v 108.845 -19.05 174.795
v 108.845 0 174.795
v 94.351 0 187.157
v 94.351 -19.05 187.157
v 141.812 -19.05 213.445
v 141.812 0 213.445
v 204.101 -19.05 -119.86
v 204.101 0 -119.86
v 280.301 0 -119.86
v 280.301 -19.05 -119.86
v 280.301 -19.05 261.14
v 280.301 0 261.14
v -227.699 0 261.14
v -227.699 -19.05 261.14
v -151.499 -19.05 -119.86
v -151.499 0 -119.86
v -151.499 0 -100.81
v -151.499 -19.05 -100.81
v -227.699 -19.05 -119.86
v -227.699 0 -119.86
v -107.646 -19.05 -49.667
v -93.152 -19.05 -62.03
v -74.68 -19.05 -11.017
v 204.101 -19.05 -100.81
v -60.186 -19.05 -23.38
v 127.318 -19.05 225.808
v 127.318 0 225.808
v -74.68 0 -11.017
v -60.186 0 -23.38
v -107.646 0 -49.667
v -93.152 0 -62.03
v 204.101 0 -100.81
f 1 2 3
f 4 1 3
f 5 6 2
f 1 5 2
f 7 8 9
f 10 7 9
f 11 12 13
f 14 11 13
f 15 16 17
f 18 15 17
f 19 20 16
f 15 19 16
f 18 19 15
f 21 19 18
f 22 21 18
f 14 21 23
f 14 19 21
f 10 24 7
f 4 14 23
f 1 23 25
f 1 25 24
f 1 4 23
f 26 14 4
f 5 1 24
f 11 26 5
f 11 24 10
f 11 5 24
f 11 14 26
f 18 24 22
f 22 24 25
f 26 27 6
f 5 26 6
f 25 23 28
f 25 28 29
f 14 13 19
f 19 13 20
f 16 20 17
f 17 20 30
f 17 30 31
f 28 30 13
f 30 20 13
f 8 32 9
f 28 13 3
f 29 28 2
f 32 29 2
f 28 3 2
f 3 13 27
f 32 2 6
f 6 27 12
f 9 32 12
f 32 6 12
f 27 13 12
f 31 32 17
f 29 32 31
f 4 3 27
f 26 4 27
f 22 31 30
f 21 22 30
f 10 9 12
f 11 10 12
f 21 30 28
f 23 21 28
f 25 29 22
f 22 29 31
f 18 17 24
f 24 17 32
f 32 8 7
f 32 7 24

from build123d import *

# Parameters (mm, degrees)
F0_W     = 76.2
F0_H     = 19.05
F1_DEPTH = 19.05


with BuildPart() as f1:
    # F0 (on Front) → F1 (new body)
    with BuildSketch(Plane.XZ):
        Polygon((280.301026, 261.140416), (-227.698974, 261.140416), (-227.698974, -100.809584), (-151.498974, -100.809584), (204.101026, -100.809584), (280.301026, -100.809584), align=None)
        Polygon((-74.679661, -11.017117), (-60.185768, -23.379542), (-93.152235, -62.029924), (-107.646129, -49.667499), align=None, mode=Mode.SUBTRACT)
        Polygon((94.351287, 187.157308), (127.317754, 225.80769), (141.811647, 213.445264), (108.84518, 174.794882), align=None, mode=Mode.SUBTRACT)
        with Locations((-189.598974, -110.334584)):
            Rectangle(F0_W, F0_H)
        with Locations((242.201026, -110.334584)):
            Rectangle(F0_W, F0_H)
    extrude(amount=F1_DEPTH)


solid = f1.part
